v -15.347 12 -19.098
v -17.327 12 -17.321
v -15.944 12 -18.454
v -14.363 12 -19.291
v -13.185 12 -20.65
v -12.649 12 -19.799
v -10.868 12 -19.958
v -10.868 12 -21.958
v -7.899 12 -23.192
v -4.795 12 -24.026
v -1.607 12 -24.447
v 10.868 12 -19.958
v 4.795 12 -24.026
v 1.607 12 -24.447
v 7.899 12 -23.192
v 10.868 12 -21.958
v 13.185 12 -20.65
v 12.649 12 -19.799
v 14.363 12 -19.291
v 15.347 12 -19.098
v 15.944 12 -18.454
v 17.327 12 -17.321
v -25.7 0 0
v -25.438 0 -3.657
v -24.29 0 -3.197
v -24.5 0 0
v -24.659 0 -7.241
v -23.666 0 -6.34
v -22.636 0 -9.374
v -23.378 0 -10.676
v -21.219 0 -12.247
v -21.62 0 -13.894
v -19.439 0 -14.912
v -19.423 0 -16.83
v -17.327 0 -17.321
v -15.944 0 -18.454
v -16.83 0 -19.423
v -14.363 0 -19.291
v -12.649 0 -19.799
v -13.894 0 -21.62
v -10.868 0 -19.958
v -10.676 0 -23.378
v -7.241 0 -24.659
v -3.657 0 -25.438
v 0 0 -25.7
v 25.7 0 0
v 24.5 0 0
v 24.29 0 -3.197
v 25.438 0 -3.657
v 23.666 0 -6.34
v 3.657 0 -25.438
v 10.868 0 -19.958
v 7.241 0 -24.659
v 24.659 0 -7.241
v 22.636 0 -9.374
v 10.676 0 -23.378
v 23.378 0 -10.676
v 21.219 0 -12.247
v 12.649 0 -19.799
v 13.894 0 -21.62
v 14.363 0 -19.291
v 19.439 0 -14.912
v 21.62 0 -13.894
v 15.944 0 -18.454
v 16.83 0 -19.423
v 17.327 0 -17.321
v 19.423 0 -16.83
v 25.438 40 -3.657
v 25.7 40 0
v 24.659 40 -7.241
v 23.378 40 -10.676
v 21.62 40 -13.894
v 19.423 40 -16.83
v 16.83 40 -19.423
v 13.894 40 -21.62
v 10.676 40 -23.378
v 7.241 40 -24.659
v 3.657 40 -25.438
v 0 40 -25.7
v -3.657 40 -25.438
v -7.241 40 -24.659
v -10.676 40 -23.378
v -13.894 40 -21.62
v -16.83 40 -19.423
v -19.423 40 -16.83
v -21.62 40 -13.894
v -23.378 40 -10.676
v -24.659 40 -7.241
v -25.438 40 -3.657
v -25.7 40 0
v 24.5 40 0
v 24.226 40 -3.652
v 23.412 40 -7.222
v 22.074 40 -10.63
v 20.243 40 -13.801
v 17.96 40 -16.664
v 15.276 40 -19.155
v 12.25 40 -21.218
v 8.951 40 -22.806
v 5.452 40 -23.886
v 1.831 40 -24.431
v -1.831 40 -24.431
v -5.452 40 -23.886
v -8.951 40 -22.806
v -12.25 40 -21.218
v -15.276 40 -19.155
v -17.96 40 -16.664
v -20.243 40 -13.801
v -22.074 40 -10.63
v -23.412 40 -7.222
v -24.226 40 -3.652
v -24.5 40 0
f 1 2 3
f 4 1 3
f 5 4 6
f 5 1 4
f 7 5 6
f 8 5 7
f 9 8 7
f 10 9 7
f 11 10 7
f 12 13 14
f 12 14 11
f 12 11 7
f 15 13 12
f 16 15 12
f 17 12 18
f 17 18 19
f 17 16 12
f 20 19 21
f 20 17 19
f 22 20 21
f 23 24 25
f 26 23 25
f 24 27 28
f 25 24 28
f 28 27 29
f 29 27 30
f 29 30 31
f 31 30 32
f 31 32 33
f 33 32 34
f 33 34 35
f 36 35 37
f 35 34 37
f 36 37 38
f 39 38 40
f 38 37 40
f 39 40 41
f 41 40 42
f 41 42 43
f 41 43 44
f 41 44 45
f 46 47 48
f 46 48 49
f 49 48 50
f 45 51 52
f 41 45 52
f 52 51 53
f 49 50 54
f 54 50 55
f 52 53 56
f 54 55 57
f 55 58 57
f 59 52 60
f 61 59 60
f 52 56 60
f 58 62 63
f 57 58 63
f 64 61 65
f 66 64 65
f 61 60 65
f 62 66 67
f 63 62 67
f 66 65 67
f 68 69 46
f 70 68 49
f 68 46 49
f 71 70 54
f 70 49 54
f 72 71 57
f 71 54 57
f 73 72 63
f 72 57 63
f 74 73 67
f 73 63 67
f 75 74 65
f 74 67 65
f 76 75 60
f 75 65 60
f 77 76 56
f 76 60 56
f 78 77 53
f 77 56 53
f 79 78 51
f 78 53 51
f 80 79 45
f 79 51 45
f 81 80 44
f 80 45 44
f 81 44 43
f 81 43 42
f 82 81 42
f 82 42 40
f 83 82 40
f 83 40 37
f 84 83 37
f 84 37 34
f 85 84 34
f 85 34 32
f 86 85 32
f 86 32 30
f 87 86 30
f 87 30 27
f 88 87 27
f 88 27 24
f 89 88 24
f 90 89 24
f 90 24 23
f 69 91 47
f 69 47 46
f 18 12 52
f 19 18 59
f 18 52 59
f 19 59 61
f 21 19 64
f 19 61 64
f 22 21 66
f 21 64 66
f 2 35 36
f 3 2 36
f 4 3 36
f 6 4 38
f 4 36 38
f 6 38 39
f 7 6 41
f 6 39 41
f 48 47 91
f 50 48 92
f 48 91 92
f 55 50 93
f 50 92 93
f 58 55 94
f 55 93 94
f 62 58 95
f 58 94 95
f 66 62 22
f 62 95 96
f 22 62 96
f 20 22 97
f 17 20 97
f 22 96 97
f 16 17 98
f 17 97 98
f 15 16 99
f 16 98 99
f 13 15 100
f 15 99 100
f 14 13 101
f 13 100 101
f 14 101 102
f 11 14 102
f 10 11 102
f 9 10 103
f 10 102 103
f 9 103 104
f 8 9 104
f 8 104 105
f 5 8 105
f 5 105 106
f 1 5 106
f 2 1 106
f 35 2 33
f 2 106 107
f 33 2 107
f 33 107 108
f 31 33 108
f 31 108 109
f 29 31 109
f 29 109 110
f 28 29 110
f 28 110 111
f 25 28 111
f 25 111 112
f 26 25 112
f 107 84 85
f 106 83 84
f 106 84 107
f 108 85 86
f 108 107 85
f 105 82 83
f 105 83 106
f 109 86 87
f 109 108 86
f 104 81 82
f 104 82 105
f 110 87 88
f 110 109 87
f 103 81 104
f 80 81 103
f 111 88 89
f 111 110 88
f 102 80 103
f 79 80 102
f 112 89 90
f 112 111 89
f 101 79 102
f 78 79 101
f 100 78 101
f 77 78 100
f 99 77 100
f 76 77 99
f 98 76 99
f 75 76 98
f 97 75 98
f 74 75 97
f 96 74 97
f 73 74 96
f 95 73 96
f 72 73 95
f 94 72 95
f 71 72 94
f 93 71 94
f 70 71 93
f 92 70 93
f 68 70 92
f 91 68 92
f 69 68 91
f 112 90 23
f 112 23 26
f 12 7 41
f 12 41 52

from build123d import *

# Parameters (mm, degrees)
SKETCH1_R           = 25.7
MAIN_CYLINDER_DEPTH = 40
SKETCH4_R           = 24.5
MAIN_CUT_DOWN_DEPTH = 100
BOSS_EXTRUDE1_START = 12
BOSS_EXTRUDE1_DEPTH = 12
FILLET1_DEPTH       = 12


with BuildPart() as part:
    # Sketch1 → Main Cylinder (new body)
    with BuildSketch(Plane(origin=(0, 0, 0), x_dir=(1, 0, 0), z_dir=(0, 1, 0))):
        with Locations(Location((0, 0, 0), (0, 0, 270))):
            Circle(SKETCH1_R)
    extrude(amount=MAIN_CYLINDER_DEPTH)

    # Sketch4 → Main cut down (cut)
    with BuildSketch(Plane(origin=(0, 40, 0), x_dir=(1, 0, 0), z_dir=(0, 1, 0))):
        Circle(SKETCH4_R)
        Polygon((0, 0), (25.7, 0), (25.7, -40.6), (-25.7, -40.6), (-25.7, 0), align=None)
    extrude(amount=-MAIN_CUT_DOWN_DEPTH, mode=Mode.SUBTRACT)

    # Sketch5 → Boss-Extrude1 (add)
    with BuildSketch(Plane(origin=(0, 0, 0), x_dir=(1, 0, 0), z_dir=(0, 1, 0)).offset(BOSS_EXTRUDE1_START)):
        with BuildLine():
            Line((-10.867812951, 19.957701193), (10.867812951, 19.957701193))
            Line((10.867812951, 19.957701193), (10.867812951, 21.957701193))
            ThreePointArc((10.867812951, 21.957701193), (0, 24.5), (-10.867812951, 21.957701193))
            Line((-10.867812951, 21.957701193), (-10.867812951, 19.957701193))
        make_face()
    extrude(amount=-BOSS_EXTRUDE1_DEPTH)

    # Fillet1: read off the stored shape, not the designer's step
    # Fillet1 outline → Fillet1 (add)
    with BuildSketch(Plane(origin=(0, 0, 0), x_dir=(1, 0, 0), z_dir=(0, 1, 0))):
        with BuildLine():
            Line((10.867812951, 21.957701193), (10.867812951, 19.957701193))
            ThreePointArc((10.867812951, 19.957701193), (14.363400898, 19.290736978), (17.327213424, 17.3210183))
            ThreePointArc((17.327213424, 17.3210183), (14.286867576, 19.903150878), (10.867812951, 21.957701193))
        make_face()
        with BuildLine():
            Line((-10.867812951, 19.957701193), (-10.867812951, 21.957701193))
            ThreePointArc((-10.867812951, 21.957701193), (-14.286867576, 19.903150878), (-17.327213424, 17.3210183))
            ThreePointArc((-17.327213424, 17.3210183), (-14.363400898, 19.290736978), (-10.867812951, 19.957701193))
        make_face()
    extrude(amount=FILLET1_DEPTH)


solid = part.part
